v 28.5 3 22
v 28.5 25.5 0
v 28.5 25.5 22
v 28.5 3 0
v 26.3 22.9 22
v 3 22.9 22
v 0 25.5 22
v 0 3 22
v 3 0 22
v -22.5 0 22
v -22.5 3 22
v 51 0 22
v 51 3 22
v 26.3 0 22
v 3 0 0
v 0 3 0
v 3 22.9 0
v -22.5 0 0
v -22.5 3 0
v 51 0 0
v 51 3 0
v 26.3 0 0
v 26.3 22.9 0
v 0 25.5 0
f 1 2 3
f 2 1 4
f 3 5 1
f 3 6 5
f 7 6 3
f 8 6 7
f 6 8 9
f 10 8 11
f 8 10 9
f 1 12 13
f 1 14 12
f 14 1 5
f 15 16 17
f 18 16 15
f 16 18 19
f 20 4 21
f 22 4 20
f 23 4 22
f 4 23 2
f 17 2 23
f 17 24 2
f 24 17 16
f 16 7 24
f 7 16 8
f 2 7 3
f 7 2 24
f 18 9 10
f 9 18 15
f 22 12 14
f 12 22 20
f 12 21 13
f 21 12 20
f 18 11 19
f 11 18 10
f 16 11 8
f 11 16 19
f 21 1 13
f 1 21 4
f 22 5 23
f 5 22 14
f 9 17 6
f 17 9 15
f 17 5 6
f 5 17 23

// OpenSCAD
//LampeVerstaerker

$fn=72;

l1=5;
d12=9.5;

l2=17;
d23=11.5;

l3A=1.5;
d3A=17.5;
d3=10;
l3=10;
d3C=16;

l4=56;

d45=8;
d5=5.5;

t=3;

module lampenstueck() {
cylinder(h=l1,d=d12);
translate([0,0,l1])
cylinder(h=l2,d1=d12,d2=d23);
translate([0,0,l1+l2])
cylinder(h=l3A,d=d3A);
translate([0,0,l1+l2])
cylinder(h=l3,d=d3);
translate([0,0,l1+l2])
cylinder(h=l3,d=d3C);
translate([0,0,l1+l2+l3])
cylinder(h=l4,d1=d45,d2=d5);
}

lt=l1+l2+l3+l4;
dh=d3A+t+2;

module huelle1() {
translate([-dh/2,0,0])
cube([dh,dh/2,lt]);
}

module haelfte()
{
difference() {
    huelle1();
    lampenstueck();
}
}

//haelfte();
lh=lt/4;
s=0.4;
module halterinnen() {
    cube([dh+s+s,dh+s,lh]);
}

module aussen() {
    cube([dh+t+t,dh+t,lh]);
    translate([-dh,0,0])
    cube([dh+t+t+dh+dh, t, lh]);
}

difference() {
    aussen();


translate([t,0,0])
halterinnen();
}
